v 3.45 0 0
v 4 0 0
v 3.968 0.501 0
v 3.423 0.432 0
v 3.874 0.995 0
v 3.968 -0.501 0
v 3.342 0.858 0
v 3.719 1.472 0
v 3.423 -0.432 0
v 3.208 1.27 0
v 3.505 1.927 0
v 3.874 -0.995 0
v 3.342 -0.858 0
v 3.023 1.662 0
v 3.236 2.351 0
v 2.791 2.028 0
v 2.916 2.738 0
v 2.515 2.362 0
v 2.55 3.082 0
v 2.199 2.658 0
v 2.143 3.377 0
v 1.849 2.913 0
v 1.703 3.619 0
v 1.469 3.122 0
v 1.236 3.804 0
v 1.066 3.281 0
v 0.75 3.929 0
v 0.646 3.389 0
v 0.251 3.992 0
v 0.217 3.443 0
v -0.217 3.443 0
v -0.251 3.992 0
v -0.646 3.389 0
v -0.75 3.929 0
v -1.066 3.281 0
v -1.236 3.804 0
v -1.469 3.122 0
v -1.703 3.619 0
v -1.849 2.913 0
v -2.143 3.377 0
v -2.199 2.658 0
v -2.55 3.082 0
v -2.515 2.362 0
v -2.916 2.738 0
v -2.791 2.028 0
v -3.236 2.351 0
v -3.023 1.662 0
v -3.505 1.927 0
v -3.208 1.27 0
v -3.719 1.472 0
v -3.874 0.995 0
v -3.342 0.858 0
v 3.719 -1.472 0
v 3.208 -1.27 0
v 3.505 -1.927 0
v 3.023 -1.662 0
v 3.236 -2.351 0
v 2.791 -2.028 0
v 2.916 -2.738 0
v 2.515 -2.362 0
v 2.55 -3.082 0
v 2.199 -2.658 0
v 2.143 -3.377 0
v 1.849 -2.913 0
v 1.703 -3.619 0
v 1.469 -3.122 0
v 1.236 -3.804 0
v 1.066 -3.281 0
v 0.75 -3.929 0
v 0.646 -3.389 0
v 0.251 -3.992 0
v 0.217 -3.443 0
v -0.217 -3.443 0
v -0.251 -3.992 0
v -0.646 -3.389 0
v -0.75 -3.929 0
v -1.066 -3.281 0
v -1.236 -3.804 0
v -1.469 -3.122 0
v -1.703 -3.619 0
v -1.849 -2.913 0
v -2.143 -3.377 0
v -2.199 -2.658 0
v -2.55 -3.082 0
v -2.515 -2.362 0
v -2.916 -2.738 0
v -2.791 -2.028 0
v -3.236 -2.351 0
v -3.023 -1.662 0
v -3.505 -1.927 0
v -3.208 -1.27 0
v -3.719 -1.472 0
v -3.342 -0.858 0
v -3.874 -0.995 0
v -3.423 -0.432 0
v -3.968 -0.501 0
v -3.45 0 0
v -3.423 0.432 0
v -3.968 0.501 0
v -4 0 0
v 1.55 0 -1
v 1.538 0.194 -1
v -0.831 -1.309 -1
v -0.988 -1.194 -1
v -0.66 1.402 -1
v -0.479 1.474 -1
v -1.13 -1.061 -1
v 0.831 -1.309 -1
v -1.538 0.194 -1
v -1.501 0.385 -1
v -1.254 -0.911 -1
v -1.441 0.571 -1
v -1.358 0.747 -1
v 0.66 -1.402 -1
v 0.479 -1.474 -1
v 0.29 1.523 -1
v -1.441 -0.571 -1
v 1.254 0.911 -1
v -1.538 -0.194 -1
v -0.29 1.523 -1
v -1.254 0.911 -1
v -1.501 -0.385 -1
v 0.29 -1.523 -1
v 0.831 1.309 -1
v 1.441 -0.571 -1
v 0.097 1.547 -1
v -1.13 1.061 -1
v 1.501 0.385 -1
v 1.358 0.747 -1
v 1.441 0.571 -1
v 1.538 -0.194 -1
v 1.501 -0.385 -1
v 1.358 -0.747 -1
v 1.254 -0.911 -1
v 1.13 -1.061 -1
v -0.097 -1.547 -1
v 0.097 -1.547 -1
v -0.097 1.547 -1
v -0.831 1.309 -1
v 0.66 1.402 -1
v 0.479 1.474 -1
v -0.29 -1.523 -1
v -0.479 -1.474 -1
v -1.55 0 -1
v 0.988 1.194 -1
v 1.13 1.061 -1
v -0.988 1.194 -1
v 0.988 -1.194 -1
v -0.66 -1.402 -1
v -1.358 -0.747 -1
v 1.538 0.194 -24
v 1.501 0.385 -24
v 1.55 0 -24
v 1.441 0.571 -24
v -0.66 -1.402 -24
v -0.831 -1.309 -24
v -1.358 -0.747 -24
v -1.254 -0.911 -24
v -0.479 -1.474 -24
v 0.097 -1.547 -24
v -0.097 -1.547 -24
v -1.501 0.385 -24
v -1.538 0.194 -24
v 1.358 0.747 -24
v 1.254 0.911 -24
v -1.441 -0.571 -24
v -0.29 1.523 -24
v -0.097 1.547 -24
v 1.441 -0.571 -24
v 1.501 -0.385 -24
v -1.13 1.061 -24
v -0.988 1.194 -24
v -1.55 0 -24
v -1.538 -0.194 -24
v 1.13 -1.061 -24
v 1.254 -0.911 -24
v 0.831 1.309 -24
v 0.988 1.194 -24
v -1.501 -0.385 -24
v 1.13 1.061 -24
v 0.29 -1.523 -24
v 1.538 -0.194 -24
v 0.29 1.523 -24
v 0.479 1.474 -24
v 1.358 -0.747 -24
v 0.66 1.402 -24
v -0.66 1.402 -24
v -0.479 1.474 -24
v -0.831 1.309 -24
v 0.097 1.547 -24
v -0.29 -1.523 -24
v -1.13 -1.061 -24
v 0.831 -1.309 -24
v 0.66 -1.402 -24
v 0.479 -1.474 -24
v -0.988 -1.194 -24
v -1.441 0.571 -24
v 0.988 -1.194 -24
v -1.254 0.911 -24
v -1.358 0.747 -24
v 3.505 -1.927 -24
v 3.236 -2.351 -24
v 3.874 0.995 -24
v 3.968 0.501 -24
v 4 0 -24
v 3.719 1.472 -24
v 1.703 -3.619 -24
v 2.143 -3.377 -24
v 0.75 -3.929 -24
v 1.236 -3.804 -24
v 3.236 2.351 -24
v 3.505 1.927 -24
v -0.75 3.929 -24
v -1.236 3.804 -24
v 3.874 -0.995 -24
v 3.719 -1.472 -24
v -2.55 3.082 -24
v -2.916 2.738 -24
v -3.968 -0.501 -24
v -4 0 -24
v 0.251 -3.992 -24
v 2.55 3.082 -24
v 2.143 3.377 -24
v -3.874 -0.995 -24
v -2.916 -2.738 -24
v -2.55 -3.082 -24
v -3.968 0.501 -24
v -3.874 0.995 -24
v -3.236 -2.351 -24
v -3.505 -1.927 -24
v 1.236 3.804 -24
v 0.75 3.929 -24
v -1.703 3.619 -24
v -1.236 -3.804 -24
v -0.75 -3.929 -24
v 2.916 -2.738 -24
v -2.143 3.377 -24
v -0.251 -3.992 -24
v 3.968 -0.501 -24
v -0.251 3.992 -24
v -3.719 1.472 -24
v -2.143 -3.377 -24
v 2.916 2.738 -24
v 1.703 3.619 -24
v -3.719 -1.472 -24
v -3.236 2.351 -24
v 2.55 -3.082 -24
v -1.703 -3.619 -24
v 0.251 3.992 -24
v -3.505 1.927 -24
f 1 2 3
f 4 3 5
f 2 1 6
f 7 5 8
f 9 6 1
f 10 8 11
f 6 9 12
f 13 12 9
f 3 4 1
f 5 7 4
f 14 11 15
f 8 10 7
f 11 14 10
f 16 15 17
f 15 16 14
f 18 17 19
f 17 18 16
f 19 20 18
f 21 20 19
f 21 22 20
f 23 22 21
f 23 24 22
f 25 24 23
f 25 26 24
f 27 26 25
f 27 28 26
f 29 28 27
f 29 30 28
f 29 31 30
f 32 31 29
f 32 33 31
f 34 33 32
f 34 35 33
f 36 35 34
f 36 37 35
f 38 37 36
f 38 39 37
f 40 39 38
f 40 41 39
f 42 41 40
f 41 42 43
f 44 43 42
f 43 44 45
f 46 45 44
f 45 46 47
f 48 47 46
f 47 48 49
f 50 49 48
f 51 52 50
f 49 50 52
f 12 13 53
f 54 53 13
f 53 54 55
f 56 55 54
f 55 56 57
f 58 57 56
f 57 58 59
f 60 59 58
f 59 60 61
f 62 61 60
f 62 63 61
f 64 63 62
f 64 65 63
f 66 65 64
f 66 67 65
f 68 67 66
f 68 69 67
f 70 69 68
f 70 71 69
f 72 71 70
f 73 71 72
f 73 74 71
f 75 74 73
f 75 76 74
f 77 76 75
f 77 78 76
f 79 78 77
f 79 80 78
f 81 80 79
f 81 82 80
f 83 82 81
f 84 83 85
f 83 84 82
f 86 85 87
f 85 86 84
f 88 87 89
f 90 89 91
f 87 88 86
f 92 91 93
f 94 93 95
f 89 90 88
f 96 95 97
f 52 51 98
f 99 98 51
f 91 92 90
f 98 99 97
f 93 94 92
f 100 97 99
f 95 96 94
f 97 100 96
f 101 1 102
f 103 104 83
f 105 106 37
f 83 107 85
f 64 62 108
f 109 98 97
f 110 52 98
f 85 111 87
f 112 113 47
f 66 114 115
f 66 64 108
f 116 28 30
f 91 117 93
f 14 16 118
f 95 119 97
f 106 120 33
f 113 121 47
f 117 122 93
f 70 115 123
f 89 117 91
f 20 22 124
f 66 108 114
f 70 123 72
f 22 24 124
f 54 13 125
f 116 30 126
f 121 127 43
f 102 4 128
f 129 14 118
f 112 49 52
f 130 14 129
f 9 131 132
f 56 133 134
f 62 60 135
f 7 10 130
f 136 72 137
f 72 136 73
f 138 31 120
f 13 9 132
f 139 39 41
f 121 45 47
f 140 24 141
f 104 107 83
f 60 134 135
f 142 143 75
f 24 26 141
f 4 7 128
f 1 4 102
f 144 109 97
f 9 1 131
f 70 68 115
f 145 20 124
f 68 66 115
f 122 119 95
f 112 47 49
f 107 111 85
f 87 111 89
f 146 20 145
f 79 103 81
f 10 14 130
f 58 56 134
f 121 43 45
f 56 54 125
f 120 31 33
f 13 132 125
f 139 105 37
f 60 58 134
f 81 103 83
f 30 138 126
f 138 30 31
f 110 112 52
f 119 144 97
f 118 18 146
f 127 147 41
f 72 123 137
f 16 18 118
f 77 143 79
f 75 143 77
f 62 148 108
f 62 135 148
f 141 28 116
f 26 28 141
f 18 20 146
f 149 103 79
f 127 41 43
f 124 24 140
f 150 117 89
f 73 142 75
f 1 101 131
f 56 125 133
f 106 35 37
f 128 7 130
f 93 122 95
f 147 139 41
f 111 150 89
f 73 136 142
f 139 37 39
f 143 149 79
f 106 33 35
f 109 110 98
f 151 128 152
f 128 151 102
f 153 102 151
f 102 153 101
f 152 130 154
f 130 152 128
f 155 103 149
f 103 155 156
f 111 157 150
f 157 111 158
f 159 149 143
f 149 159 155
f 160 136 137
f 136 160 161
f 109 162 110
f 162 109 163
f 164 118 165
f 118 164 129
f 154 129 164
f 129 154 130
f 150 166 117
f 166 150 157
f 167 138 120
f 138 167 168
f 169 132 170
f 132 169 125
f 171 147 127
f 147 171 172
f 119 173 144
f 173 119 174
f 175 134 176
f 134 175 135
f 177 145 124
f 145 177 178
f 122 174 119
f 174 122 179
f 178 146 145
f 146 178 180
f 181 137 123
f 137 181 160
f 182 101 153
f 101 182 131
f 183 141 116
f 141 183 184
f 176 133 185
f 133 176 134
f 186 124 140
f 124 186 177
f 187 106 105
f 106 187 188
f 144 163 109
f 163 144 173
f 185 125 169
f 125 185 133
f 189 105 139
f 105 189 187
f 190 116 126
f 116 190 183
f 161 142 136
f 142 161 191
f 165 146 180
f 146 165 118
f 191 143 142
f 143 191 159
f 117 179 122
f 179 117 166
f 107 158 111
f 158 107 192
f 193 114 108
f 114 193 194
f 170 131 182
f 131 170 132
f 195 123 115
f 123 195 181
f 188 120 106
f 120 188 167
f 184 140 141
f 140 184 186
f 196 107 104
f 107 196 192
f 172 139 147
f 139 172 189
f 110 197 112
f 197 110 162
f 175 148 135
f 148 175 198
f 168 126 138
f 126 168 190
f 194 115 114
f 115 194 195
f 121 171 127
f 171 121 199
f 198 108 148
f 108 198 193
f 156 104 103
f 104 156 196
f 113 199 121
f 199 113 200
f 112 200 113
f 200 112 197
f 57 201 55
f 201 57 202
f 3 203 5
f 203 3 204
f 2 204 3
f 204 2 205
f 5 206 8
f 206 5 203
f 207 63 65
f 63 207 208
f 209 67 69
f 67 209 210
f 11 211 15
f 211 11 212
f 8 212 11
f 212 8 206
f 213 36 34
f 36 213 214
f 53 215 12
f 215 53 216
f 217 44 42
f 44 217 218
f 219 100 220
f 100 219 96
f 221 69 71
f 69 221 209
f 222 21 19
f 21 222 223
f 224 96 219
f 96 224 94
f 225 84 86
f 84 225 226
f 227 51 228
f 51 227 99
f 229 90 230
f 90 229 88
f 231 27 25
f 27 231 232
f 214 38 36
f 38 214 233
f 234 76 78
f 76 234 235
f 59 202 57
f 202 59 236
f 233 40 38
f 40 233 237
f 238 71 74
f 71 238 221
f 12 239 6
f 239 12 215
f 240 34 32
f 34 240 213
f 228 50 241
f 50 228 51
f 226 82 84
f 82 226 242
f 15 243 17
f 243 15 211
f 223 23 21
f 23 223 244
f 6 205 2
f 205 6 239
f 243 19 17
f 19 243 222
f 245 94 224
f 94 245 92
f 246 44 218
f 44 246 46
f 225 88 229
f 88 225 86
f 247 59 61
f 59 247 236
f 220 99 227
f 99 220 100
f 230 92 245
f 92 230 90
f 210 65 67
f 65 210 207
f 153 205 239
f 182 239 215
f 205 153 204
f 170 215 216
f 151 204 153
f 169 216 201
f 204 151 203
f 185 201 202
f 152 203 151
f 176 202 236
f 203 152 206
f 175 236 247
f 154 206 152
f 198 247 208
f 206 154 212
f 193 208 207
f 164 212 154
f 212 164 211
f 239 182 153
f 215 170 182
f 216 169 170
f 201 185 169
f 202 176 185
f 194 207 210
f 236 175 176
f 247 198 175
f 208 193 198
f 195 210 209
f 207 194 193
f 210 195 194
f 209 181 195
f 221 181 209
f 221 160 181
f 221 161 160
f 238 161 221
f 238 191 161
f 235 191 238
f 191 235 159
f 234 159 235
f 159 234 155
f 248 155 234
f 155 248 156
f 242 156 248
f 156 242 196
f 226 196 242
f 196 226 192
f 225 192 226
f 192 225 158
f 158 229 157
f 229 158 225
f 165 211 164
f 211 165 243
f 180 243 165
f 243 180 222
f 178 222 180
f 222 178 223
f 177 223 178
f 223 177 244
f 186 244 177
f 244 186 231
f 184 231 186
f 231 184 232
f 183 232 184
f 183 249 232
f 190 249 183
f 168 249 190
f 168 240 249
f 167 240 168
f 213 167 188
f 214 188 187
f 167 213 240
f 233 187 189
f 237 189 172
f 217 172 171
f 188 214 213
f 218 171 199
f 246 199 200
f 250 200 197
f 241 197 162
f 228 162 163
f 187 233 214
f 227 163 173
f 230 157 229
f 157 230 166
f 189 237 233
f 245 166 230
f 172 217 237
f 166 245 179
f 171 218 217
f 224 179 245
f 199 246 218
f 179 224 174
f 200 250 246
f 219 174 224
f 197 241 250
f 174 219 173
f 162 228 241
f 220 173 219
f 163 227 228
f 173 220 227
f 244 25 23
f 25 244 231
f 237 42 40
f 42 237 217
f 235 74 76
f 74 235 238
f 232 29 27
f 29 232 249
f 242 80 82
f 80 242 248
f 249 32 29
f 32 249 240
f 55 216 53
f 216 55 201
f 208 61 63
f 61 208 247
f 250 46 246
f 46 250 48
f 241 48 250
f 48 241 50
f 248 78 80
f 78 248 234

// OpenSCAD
$fn = 50;

difference() {
	union() {
		translate(v = [0, 0, -24.0]) {
			cylinder(h = 27, r = 4.0);
		}
	}
	union() {
		translate(v = [0, 0, 0]) {
			rotate(a = [0, 0, 0]) {
				difference() {
					union() {
						translate(v = [0, 0, -27.0]) {
							cylinder(h = 27, r = 1.25);
						}
						translate(v = [0, 0, -1.0]) {
							cylinder(h = 1.0, r1 = 1.55, r2 = 3.45);
						}
						translate(v = [0, 0, -27.0]) {
							cylinder(h = 27, r = 1.55);
						}
						translate(v = [0, 0, -27.0]) {
							cylinder(h = 27, r = 1.25);
						}
					}
					union();
				}
			}
		}
		#cylinder(h = 3, r = 5.0);
	}
}
